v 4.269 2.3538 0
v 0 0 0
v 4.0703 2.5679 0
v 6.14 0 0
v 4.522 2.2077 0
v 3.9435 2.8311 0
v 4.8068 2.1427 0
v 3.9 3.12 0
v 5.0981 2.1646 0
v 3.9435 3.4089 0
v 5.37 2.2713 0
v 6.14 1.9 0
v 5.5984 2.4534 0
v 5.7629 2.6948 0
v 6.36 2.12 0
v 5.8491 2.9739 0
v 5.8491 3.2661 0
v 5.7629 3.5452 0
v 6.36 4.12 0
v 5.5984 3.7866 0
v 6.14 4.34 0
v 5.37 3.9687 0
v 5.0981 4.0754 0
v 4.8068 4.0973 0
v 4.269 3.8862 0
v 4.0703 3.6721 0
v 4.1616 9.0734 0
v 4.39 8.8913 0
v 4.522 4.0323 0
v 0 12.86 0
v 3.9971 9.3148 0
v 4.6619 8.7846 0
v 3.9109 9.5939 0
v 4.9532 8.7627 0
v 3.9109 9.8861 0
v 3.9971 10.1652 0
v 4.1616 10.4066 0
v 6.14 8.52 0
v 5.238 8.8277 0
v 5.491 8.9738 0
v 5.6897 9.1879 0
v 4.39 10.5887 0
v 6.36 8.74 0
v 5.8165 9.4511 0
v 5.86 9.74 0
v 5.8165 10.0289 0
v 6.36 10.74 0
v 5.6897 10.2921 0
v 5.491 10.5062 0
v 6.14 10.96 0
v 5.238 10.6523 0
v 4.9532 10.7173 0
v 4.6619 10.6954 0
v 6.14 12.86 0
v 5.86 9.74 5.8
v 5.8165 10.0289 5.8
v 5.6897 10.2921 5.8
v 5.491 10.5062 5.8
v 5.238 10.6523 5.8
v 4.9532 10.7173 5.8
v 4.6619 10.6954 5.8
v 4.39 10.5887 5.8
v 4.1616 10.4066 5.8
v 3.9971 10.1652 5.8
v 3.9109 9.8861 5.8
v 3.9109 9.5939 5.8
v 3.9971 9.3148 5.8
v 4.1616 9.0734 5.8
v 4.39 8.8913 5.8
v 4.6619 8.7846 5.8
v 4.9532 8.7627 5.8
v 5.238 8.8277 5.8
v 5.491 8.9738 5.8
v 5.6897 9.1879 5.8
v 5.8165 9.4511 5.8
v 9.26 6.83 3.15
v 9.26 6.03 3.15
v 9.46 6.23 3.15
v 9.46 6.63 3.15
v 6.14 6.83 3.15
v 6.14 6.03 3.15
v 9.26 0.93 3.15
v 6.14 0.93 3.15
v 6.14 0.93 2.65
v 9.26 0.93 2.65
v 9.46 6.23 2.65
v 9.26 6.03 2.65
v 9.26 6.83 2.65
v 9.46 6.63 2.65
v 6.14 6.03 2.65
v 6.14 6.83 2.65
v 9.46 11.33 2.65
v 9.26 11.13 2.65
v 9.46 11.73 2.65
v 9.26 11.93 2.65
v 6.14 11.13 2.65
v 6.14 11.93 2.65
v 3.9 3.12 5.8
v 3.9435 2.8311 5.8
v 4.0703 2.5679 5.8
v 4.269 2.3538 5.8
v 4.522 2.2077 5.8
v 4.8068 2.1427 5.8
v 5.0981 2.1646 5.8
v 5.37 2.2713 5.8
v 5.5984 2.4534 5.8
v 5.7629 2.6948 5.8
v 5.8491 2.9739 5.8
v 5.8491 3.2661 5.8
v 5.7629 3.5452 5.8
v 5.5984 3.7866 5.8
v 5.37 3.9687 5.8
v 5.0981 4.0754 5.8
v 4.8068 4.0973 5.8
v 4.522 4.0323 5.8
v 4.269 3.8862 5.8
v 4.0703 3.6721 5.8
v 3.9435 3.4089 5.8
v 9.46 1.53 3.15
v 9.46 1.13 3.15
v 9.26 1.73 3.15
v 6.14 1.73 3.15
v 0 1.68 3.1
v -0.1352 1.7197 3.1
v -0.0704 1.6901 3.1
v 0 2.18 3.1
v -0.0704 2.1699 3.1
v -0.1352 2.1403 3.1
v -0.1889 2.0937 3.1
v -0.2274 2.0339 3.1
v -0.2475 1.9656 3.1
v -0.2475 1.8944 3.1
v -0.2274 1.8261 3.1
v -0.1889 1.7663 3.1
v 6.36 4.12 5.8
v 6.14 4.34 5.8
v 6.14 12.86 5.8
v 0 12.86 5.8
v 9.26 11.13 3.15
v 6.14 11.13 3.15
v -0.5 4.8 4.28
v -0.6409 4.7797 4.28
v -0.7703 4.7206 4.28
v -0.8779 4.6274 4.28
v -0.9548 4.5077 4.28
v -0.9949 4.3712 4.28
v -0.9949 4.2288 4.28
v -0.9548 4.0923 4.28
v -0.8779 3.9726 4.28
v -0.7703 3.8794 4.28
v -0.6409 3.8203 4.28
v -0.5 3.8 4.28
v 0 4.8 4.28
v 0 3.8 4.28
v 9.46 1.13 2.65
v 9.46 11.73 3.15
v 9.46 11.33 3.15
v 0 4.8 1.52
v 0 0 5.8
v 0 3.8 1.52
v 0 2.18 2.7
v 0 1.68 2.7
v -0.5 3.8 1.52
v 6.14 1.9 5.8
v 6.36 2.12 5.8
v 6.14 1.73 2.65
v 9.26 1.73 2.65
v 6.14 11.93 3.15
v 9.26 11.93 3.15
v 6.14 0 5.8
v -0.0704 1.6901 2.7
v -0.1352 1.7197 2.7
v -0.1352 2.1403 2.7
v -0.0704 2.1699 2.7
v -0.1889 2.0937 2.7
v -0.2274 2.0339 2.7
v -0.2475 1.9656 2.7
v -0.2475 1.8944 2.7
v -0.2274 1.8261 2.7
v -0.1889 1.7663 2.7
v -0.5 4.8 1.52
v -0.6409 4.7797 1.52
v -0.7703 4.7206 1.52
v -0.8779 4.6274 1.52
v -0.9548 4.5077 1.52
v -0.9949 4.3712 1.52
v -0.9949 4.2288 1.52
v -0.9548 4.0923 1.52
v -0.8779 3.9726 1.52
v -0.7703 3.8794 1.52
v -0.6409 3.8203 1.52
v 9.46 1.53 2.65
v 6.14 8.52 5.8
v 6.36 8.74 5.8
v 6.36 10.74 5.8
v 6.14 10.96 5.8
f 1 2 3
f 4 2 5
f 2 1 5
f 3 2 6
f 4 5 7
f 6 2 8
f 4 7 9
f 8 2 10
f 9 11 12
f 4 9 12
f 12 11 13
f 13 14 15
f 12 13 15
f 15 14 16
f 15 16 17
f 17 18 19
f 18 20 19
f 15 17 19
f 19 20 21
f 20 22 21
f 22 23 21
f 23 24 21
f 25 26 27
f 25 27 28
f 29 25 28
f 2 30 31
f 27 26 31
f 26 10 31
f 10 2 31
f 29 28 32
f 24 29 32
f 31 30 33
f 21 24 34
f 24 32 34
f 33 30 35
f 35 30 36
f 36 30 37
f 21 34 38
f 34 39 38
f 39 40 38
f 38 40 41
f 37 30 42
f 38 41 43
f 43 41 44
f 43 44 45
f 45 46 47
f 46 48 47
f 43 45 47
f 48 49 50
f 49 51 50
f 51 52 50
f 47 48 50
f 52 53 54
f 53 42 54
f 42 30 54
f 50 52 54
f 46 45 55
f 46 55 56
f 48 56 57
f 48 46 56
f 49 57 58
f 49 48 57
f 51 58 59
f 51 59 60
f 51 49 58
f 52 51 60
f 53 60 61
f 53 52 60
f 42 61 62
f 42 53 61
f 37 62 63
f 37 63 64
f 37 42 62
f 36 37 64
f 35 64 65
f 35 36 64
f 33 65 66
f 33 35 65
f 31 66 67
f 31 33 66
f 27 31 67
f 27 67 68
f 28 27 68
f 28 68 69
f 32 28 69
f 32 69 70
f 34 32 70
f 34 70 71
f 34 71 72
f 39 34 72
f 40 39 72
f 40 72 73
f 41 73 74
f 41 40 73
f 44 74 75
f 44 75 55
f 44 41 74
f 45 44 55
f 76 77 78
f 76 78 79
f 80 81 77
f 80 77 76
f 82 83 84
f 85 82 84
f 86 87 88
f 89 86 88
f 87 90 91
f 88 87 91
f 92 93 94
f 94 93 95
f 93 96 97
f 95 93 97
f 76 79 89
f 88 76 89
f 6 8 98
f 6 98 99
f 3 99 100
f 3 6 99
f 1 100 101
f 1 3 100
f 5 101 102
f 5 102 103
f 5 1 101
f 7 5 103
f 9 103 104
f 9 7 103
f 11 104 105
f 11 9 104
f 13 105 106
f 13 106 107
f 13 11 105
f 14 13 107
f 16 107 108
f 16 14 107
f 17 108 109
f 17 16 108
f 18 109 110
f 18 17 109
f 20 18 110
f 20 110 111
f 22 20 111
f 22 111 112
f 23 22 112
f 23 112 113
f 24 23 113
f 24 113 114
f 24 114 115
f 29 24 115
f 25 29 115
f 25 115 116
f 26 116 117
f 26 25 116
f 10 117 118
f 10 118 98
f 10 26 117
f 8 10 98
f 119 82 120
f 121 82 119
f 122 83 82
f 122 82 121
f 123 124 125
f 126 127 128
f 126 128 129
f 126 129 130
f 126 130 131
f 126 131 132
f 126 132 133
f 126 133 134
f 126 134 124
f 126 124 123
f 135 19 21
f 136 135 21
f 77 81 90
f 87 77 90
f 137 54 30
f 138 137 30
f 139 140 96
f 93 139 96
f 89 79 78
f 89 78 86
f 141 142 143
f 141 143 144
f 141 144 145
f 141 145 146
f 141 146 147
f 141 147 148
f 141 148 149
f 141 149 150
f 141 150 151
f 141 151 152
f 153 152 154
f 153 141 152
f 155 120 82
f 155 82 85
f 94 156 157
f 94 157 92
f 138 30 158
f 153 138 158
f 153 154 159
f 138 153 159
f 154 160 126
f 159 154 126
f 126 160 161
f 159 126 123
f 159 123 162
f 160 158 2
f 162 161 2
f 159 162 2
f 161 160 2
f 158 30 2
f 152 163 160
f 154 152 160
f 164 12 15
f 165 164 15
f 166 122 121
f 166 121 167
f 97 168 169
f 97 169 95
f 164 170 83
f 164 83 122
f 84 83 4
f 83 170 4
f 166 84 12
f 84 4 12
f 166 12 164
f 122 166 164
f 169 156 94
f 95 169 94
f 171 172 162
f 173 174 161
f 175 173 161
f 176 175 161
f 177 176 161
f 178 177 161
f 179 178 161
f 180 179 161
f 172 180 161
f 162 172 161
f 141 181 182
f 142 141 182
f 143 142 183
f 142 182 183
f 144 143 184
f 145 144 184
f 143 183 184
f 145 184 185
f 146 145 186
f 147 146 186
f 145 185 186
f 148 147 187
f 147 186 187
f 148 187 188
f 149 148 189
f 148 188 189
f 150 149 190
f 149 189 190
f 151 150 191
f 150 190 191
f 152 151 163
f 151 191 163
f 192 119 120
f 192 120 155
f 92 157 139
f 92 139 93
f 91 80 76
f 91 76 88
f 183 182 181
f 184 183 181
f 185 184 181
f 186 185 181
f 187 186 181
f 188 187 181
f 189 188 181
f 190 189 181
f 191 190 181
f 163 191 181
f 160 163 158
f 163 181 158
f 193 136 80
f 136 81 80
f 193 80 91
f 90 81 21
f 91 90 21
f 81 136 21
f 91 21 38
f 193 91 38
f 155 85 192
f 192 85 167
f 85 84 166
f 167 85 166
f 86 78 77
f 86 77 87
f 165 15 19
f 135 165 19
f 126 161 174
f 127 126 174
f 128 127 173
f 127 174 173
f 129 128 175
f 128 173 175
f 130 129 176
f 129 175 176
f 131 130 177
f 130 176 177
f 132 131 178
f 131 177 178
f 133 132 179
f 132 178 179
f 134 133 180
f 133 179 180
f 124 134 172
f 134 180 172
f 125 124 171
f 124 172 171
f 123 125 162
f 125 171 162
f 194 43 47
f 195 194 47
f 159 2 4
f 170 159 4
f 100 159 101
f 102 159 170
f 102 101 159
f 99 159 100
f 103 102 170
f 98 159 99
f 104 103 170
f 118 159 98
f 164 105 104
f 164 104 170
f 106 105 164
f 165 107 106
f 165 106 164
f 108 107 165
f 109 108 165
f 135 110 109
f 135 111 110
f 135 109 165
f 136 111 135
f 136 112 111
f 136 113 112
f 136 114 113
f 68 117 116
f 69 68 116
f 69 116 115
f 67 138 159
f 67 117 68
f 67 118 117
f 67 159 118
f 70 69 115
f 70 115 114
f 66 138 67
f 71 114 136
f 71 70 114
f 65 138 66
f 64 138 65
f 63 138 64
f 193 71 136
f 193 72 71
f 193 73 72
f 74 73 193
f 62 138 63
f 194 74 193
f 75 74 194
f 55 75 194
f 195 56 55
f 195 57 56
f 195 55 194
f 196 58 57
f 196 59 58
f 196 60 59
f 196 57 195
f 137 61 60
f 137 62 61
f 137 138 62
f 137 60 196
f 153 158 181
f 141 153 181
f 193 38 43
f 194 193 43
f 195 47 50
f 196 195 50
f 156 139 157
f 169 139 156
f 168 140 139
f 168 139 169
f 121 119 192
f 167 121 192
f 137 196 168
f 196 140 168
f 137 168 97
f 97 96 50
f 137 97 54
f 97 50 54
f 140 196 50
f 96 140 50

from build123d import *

# Parameters (mm, degrees)
SKETCH_1_R           = 0.98
EXTRUDE_1_DEPTH      = 5.8
SKETCH_2_W           = 0.5
SKETCH_2_H           = 0.8
EXTRUDE_2_DEPTH      = 3.32
CHAMFER_2_SIZE       = 0.2
EXTRUDE_3_DEPTH      = 1.38
EXTRUDE_3_DEPTH_BACK = 1.38
EXTRUDE_4_DEPTH      = 0.2
EXTRUDE_4_DEPTH_BACK = 0.2
SKETCH_4_R           = 0.25


with BuildPart() as part:
    # 草图1 → 凸台-拉伸1 (new body)
    with BuildSketch(Plane.XY):
        Polygon((0, 0), (6.14, 0), (6.14, 1.9), (6.36, 2.12), (6.36, 4.12), (6.14, 4.34), (6.14, 8.52), (6.36, 8.74), (6.36, 10.74), (6.14, 10.96), (6.14, 12.86), (0, 12.86), align=None)
        with Locations((4.88, 9.74)):
            Circle(SKETCH_1_R, mode=Mode.SUBTRACT)
        with Locations(Location((4.88, 3.12, 0), (0, 0, 180))):
            Circle(SKETCH_1_R, mode=Mode.SUBTRACT)
    extrude(amount=EXTRUDE_1_DEPTH)

    # 草图2 → 凸台-拉伸2 (add)
    with BuildSketch(Plane(origin=(6.14, 0, 0), x_dir=(0, 0, -1), z_dir=(1, 0, 0))):
        with Locations((-2.9, 11.53)):
            Rectangle(SKETCH_2_W, SKETCH_2_H)
        with Locations((-2.9, 1.33)):
            Rectangle(SKETCH_2_W, SKETCH_2_H)
        with Locations((-2.9, 6.43)):
            Rectangle(SKETCH_2_W, SKETCH_2_H)
    extrude(amount=EXTRUDE_2_DEPTH)

    # 倒角2
    chamfer_2_edges = [part.edges().sort_by_distance(p)[0] for p in [
        (9.46, 11.13, 2.9),
        (9.46, 11.93, 2.9),
        (9.46, 0.93, 2.9),
        (9.46, 1.73, 2.9),
        (9.46, 6.03, 2.9),
        (9.46, 6.83, 2.9),
    ]]
    chamfer(chamfer_2_edges, length=CHAMFER_2_SIZE)

    # 草图3 → 凸台-拉伸3 (add, two sides: drawn at the far end of the back side and taken through both)
    with BuildSketch(Plane.XY.offset(2.9).offset(-EXTRUDE_3_DEPTH_BACK)):
        with BuildLine():
            Line((0, 4.8), (-0.5, 4.8))
            ThreePointArc((-0.5, 4.8), (-1, 4.3), (-0.5, 3.8))
            Line((-0.5, 3.8), (0, 3.8))
            Line((0, 3.8), (0, 4.8))
        make_face()
    extrude(amount=EXTRUDE_3_DEPTH + EXTRUDE_3_DEPTH_BACK)

    # 草图4 → 凸台-拉伸4 (add, two sides: drawn at the far end of the back side and taken through both)
    with BuildSketch(Plane.XY.offset(2.9).offset(-EXTRUDE_4_DEPTH_BACK)):
        with Locations((0, 1.93)):
            Circle(SKETCH_4_R)
    extrude(amount=EXTRUDE_4_DEPTH + EXTRUDE_4_DEPTH_BACK)


solid = part.part
